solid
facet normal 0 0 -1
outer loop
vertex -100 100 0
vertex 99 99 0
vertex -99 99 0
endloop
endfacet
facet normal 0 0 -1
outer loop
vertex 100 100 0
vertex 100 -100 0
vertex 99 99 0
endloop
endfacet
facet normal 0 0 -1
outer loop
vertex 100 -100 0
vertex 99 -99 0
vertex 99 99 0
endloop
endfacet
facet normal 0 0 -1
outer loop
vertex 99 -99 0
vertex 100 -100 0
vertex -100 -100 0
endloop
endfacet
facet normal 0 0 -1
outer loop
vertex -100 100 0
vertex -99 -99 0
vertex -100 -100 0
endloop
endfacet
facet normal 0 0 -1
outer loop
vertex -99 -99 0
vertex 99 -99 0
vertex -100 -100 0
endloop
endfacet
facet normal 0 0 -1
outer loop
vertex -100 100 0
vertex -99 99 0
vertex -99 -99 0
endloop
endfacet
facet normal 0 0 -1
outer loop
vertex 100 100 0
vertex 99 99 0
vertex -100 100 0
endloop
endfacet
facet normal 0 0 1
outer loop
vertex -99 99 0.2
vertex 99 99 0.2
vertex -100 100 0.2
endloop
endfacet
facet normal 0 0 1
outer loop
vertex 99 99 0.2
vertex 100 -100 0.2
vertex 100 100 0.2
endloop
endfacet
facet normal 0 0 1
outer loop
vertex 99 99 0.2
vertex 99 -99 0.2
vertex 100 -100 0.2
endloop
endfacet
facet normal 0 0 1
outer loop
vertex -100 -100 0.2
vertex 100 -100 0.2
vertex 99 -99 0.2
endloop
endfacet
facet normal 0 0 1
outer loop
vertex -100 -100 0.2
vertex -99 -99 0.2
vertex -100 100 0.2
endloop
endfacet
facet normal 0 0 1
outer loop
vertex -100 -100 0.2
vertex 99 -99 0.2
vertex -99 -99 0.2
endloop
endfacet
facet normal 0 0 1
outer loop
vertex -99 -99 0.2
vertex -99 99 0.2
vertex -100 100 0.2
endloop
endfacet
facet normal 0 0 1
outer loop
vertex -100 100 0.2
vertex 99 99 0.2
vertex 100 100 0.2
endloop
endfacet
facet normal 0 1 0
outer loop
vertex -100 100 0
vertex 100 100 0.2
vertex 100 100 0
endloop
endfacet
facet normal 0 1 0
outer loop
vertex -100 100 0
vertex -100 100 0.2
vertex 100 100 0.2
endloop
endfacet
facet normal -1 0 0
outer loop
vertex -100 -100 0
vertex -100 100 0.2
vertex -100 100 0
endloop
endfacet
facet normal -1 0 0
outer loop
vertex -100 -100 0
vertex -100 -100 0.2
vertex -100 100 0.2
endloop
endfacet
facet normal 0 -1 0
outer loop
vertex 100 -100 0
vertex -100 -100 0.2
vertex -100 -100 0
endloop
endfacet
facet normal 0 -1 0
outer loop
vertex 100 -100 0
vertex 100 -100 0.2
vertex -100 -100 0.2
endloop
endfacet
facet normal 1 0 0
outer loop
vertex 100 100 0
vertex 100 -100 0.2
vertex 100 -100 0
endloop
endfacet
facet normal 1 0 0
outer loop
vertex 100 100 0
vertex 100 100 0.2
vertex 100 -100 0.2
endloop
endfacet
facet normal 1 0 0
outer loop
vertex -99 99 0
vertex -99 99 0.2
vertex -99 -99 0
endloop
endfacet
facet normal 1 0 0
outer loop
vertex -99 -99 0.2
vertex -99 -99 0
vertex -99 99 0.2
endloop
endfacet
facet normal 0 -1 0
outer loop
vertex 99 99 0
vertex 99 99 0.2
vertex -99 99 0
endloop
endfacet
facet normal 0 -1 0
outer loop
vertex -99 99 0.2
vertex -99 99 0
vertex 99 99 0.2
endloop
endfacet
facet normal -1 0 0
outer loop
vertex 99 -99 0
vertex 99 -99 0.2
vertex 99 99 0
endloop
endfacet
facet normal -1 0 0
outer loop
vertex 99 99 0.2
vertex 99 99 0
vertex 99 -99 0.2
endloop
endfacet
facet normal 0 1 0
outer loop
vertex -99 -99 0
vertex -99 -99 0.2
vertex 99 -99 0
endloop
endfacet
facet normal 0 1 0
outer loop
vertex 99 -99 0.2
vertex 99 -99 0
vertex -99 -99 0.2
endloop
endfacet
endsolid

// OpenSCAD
// How wide should the frame be on X-axis?
x_width = 200;
// How wide should the frame be on Y-axis?
y_width = 200;
// How wide should the frame be?
frame_width = 1;
// How high should the frame be?
frame_height = 0.2;

linear_extrude(frame_height)
difference() {
    square([x_width, y_width], center=true);
    square([x_width - 2 * frame_width, y_width - 2 * frame_width], center=true);
}
